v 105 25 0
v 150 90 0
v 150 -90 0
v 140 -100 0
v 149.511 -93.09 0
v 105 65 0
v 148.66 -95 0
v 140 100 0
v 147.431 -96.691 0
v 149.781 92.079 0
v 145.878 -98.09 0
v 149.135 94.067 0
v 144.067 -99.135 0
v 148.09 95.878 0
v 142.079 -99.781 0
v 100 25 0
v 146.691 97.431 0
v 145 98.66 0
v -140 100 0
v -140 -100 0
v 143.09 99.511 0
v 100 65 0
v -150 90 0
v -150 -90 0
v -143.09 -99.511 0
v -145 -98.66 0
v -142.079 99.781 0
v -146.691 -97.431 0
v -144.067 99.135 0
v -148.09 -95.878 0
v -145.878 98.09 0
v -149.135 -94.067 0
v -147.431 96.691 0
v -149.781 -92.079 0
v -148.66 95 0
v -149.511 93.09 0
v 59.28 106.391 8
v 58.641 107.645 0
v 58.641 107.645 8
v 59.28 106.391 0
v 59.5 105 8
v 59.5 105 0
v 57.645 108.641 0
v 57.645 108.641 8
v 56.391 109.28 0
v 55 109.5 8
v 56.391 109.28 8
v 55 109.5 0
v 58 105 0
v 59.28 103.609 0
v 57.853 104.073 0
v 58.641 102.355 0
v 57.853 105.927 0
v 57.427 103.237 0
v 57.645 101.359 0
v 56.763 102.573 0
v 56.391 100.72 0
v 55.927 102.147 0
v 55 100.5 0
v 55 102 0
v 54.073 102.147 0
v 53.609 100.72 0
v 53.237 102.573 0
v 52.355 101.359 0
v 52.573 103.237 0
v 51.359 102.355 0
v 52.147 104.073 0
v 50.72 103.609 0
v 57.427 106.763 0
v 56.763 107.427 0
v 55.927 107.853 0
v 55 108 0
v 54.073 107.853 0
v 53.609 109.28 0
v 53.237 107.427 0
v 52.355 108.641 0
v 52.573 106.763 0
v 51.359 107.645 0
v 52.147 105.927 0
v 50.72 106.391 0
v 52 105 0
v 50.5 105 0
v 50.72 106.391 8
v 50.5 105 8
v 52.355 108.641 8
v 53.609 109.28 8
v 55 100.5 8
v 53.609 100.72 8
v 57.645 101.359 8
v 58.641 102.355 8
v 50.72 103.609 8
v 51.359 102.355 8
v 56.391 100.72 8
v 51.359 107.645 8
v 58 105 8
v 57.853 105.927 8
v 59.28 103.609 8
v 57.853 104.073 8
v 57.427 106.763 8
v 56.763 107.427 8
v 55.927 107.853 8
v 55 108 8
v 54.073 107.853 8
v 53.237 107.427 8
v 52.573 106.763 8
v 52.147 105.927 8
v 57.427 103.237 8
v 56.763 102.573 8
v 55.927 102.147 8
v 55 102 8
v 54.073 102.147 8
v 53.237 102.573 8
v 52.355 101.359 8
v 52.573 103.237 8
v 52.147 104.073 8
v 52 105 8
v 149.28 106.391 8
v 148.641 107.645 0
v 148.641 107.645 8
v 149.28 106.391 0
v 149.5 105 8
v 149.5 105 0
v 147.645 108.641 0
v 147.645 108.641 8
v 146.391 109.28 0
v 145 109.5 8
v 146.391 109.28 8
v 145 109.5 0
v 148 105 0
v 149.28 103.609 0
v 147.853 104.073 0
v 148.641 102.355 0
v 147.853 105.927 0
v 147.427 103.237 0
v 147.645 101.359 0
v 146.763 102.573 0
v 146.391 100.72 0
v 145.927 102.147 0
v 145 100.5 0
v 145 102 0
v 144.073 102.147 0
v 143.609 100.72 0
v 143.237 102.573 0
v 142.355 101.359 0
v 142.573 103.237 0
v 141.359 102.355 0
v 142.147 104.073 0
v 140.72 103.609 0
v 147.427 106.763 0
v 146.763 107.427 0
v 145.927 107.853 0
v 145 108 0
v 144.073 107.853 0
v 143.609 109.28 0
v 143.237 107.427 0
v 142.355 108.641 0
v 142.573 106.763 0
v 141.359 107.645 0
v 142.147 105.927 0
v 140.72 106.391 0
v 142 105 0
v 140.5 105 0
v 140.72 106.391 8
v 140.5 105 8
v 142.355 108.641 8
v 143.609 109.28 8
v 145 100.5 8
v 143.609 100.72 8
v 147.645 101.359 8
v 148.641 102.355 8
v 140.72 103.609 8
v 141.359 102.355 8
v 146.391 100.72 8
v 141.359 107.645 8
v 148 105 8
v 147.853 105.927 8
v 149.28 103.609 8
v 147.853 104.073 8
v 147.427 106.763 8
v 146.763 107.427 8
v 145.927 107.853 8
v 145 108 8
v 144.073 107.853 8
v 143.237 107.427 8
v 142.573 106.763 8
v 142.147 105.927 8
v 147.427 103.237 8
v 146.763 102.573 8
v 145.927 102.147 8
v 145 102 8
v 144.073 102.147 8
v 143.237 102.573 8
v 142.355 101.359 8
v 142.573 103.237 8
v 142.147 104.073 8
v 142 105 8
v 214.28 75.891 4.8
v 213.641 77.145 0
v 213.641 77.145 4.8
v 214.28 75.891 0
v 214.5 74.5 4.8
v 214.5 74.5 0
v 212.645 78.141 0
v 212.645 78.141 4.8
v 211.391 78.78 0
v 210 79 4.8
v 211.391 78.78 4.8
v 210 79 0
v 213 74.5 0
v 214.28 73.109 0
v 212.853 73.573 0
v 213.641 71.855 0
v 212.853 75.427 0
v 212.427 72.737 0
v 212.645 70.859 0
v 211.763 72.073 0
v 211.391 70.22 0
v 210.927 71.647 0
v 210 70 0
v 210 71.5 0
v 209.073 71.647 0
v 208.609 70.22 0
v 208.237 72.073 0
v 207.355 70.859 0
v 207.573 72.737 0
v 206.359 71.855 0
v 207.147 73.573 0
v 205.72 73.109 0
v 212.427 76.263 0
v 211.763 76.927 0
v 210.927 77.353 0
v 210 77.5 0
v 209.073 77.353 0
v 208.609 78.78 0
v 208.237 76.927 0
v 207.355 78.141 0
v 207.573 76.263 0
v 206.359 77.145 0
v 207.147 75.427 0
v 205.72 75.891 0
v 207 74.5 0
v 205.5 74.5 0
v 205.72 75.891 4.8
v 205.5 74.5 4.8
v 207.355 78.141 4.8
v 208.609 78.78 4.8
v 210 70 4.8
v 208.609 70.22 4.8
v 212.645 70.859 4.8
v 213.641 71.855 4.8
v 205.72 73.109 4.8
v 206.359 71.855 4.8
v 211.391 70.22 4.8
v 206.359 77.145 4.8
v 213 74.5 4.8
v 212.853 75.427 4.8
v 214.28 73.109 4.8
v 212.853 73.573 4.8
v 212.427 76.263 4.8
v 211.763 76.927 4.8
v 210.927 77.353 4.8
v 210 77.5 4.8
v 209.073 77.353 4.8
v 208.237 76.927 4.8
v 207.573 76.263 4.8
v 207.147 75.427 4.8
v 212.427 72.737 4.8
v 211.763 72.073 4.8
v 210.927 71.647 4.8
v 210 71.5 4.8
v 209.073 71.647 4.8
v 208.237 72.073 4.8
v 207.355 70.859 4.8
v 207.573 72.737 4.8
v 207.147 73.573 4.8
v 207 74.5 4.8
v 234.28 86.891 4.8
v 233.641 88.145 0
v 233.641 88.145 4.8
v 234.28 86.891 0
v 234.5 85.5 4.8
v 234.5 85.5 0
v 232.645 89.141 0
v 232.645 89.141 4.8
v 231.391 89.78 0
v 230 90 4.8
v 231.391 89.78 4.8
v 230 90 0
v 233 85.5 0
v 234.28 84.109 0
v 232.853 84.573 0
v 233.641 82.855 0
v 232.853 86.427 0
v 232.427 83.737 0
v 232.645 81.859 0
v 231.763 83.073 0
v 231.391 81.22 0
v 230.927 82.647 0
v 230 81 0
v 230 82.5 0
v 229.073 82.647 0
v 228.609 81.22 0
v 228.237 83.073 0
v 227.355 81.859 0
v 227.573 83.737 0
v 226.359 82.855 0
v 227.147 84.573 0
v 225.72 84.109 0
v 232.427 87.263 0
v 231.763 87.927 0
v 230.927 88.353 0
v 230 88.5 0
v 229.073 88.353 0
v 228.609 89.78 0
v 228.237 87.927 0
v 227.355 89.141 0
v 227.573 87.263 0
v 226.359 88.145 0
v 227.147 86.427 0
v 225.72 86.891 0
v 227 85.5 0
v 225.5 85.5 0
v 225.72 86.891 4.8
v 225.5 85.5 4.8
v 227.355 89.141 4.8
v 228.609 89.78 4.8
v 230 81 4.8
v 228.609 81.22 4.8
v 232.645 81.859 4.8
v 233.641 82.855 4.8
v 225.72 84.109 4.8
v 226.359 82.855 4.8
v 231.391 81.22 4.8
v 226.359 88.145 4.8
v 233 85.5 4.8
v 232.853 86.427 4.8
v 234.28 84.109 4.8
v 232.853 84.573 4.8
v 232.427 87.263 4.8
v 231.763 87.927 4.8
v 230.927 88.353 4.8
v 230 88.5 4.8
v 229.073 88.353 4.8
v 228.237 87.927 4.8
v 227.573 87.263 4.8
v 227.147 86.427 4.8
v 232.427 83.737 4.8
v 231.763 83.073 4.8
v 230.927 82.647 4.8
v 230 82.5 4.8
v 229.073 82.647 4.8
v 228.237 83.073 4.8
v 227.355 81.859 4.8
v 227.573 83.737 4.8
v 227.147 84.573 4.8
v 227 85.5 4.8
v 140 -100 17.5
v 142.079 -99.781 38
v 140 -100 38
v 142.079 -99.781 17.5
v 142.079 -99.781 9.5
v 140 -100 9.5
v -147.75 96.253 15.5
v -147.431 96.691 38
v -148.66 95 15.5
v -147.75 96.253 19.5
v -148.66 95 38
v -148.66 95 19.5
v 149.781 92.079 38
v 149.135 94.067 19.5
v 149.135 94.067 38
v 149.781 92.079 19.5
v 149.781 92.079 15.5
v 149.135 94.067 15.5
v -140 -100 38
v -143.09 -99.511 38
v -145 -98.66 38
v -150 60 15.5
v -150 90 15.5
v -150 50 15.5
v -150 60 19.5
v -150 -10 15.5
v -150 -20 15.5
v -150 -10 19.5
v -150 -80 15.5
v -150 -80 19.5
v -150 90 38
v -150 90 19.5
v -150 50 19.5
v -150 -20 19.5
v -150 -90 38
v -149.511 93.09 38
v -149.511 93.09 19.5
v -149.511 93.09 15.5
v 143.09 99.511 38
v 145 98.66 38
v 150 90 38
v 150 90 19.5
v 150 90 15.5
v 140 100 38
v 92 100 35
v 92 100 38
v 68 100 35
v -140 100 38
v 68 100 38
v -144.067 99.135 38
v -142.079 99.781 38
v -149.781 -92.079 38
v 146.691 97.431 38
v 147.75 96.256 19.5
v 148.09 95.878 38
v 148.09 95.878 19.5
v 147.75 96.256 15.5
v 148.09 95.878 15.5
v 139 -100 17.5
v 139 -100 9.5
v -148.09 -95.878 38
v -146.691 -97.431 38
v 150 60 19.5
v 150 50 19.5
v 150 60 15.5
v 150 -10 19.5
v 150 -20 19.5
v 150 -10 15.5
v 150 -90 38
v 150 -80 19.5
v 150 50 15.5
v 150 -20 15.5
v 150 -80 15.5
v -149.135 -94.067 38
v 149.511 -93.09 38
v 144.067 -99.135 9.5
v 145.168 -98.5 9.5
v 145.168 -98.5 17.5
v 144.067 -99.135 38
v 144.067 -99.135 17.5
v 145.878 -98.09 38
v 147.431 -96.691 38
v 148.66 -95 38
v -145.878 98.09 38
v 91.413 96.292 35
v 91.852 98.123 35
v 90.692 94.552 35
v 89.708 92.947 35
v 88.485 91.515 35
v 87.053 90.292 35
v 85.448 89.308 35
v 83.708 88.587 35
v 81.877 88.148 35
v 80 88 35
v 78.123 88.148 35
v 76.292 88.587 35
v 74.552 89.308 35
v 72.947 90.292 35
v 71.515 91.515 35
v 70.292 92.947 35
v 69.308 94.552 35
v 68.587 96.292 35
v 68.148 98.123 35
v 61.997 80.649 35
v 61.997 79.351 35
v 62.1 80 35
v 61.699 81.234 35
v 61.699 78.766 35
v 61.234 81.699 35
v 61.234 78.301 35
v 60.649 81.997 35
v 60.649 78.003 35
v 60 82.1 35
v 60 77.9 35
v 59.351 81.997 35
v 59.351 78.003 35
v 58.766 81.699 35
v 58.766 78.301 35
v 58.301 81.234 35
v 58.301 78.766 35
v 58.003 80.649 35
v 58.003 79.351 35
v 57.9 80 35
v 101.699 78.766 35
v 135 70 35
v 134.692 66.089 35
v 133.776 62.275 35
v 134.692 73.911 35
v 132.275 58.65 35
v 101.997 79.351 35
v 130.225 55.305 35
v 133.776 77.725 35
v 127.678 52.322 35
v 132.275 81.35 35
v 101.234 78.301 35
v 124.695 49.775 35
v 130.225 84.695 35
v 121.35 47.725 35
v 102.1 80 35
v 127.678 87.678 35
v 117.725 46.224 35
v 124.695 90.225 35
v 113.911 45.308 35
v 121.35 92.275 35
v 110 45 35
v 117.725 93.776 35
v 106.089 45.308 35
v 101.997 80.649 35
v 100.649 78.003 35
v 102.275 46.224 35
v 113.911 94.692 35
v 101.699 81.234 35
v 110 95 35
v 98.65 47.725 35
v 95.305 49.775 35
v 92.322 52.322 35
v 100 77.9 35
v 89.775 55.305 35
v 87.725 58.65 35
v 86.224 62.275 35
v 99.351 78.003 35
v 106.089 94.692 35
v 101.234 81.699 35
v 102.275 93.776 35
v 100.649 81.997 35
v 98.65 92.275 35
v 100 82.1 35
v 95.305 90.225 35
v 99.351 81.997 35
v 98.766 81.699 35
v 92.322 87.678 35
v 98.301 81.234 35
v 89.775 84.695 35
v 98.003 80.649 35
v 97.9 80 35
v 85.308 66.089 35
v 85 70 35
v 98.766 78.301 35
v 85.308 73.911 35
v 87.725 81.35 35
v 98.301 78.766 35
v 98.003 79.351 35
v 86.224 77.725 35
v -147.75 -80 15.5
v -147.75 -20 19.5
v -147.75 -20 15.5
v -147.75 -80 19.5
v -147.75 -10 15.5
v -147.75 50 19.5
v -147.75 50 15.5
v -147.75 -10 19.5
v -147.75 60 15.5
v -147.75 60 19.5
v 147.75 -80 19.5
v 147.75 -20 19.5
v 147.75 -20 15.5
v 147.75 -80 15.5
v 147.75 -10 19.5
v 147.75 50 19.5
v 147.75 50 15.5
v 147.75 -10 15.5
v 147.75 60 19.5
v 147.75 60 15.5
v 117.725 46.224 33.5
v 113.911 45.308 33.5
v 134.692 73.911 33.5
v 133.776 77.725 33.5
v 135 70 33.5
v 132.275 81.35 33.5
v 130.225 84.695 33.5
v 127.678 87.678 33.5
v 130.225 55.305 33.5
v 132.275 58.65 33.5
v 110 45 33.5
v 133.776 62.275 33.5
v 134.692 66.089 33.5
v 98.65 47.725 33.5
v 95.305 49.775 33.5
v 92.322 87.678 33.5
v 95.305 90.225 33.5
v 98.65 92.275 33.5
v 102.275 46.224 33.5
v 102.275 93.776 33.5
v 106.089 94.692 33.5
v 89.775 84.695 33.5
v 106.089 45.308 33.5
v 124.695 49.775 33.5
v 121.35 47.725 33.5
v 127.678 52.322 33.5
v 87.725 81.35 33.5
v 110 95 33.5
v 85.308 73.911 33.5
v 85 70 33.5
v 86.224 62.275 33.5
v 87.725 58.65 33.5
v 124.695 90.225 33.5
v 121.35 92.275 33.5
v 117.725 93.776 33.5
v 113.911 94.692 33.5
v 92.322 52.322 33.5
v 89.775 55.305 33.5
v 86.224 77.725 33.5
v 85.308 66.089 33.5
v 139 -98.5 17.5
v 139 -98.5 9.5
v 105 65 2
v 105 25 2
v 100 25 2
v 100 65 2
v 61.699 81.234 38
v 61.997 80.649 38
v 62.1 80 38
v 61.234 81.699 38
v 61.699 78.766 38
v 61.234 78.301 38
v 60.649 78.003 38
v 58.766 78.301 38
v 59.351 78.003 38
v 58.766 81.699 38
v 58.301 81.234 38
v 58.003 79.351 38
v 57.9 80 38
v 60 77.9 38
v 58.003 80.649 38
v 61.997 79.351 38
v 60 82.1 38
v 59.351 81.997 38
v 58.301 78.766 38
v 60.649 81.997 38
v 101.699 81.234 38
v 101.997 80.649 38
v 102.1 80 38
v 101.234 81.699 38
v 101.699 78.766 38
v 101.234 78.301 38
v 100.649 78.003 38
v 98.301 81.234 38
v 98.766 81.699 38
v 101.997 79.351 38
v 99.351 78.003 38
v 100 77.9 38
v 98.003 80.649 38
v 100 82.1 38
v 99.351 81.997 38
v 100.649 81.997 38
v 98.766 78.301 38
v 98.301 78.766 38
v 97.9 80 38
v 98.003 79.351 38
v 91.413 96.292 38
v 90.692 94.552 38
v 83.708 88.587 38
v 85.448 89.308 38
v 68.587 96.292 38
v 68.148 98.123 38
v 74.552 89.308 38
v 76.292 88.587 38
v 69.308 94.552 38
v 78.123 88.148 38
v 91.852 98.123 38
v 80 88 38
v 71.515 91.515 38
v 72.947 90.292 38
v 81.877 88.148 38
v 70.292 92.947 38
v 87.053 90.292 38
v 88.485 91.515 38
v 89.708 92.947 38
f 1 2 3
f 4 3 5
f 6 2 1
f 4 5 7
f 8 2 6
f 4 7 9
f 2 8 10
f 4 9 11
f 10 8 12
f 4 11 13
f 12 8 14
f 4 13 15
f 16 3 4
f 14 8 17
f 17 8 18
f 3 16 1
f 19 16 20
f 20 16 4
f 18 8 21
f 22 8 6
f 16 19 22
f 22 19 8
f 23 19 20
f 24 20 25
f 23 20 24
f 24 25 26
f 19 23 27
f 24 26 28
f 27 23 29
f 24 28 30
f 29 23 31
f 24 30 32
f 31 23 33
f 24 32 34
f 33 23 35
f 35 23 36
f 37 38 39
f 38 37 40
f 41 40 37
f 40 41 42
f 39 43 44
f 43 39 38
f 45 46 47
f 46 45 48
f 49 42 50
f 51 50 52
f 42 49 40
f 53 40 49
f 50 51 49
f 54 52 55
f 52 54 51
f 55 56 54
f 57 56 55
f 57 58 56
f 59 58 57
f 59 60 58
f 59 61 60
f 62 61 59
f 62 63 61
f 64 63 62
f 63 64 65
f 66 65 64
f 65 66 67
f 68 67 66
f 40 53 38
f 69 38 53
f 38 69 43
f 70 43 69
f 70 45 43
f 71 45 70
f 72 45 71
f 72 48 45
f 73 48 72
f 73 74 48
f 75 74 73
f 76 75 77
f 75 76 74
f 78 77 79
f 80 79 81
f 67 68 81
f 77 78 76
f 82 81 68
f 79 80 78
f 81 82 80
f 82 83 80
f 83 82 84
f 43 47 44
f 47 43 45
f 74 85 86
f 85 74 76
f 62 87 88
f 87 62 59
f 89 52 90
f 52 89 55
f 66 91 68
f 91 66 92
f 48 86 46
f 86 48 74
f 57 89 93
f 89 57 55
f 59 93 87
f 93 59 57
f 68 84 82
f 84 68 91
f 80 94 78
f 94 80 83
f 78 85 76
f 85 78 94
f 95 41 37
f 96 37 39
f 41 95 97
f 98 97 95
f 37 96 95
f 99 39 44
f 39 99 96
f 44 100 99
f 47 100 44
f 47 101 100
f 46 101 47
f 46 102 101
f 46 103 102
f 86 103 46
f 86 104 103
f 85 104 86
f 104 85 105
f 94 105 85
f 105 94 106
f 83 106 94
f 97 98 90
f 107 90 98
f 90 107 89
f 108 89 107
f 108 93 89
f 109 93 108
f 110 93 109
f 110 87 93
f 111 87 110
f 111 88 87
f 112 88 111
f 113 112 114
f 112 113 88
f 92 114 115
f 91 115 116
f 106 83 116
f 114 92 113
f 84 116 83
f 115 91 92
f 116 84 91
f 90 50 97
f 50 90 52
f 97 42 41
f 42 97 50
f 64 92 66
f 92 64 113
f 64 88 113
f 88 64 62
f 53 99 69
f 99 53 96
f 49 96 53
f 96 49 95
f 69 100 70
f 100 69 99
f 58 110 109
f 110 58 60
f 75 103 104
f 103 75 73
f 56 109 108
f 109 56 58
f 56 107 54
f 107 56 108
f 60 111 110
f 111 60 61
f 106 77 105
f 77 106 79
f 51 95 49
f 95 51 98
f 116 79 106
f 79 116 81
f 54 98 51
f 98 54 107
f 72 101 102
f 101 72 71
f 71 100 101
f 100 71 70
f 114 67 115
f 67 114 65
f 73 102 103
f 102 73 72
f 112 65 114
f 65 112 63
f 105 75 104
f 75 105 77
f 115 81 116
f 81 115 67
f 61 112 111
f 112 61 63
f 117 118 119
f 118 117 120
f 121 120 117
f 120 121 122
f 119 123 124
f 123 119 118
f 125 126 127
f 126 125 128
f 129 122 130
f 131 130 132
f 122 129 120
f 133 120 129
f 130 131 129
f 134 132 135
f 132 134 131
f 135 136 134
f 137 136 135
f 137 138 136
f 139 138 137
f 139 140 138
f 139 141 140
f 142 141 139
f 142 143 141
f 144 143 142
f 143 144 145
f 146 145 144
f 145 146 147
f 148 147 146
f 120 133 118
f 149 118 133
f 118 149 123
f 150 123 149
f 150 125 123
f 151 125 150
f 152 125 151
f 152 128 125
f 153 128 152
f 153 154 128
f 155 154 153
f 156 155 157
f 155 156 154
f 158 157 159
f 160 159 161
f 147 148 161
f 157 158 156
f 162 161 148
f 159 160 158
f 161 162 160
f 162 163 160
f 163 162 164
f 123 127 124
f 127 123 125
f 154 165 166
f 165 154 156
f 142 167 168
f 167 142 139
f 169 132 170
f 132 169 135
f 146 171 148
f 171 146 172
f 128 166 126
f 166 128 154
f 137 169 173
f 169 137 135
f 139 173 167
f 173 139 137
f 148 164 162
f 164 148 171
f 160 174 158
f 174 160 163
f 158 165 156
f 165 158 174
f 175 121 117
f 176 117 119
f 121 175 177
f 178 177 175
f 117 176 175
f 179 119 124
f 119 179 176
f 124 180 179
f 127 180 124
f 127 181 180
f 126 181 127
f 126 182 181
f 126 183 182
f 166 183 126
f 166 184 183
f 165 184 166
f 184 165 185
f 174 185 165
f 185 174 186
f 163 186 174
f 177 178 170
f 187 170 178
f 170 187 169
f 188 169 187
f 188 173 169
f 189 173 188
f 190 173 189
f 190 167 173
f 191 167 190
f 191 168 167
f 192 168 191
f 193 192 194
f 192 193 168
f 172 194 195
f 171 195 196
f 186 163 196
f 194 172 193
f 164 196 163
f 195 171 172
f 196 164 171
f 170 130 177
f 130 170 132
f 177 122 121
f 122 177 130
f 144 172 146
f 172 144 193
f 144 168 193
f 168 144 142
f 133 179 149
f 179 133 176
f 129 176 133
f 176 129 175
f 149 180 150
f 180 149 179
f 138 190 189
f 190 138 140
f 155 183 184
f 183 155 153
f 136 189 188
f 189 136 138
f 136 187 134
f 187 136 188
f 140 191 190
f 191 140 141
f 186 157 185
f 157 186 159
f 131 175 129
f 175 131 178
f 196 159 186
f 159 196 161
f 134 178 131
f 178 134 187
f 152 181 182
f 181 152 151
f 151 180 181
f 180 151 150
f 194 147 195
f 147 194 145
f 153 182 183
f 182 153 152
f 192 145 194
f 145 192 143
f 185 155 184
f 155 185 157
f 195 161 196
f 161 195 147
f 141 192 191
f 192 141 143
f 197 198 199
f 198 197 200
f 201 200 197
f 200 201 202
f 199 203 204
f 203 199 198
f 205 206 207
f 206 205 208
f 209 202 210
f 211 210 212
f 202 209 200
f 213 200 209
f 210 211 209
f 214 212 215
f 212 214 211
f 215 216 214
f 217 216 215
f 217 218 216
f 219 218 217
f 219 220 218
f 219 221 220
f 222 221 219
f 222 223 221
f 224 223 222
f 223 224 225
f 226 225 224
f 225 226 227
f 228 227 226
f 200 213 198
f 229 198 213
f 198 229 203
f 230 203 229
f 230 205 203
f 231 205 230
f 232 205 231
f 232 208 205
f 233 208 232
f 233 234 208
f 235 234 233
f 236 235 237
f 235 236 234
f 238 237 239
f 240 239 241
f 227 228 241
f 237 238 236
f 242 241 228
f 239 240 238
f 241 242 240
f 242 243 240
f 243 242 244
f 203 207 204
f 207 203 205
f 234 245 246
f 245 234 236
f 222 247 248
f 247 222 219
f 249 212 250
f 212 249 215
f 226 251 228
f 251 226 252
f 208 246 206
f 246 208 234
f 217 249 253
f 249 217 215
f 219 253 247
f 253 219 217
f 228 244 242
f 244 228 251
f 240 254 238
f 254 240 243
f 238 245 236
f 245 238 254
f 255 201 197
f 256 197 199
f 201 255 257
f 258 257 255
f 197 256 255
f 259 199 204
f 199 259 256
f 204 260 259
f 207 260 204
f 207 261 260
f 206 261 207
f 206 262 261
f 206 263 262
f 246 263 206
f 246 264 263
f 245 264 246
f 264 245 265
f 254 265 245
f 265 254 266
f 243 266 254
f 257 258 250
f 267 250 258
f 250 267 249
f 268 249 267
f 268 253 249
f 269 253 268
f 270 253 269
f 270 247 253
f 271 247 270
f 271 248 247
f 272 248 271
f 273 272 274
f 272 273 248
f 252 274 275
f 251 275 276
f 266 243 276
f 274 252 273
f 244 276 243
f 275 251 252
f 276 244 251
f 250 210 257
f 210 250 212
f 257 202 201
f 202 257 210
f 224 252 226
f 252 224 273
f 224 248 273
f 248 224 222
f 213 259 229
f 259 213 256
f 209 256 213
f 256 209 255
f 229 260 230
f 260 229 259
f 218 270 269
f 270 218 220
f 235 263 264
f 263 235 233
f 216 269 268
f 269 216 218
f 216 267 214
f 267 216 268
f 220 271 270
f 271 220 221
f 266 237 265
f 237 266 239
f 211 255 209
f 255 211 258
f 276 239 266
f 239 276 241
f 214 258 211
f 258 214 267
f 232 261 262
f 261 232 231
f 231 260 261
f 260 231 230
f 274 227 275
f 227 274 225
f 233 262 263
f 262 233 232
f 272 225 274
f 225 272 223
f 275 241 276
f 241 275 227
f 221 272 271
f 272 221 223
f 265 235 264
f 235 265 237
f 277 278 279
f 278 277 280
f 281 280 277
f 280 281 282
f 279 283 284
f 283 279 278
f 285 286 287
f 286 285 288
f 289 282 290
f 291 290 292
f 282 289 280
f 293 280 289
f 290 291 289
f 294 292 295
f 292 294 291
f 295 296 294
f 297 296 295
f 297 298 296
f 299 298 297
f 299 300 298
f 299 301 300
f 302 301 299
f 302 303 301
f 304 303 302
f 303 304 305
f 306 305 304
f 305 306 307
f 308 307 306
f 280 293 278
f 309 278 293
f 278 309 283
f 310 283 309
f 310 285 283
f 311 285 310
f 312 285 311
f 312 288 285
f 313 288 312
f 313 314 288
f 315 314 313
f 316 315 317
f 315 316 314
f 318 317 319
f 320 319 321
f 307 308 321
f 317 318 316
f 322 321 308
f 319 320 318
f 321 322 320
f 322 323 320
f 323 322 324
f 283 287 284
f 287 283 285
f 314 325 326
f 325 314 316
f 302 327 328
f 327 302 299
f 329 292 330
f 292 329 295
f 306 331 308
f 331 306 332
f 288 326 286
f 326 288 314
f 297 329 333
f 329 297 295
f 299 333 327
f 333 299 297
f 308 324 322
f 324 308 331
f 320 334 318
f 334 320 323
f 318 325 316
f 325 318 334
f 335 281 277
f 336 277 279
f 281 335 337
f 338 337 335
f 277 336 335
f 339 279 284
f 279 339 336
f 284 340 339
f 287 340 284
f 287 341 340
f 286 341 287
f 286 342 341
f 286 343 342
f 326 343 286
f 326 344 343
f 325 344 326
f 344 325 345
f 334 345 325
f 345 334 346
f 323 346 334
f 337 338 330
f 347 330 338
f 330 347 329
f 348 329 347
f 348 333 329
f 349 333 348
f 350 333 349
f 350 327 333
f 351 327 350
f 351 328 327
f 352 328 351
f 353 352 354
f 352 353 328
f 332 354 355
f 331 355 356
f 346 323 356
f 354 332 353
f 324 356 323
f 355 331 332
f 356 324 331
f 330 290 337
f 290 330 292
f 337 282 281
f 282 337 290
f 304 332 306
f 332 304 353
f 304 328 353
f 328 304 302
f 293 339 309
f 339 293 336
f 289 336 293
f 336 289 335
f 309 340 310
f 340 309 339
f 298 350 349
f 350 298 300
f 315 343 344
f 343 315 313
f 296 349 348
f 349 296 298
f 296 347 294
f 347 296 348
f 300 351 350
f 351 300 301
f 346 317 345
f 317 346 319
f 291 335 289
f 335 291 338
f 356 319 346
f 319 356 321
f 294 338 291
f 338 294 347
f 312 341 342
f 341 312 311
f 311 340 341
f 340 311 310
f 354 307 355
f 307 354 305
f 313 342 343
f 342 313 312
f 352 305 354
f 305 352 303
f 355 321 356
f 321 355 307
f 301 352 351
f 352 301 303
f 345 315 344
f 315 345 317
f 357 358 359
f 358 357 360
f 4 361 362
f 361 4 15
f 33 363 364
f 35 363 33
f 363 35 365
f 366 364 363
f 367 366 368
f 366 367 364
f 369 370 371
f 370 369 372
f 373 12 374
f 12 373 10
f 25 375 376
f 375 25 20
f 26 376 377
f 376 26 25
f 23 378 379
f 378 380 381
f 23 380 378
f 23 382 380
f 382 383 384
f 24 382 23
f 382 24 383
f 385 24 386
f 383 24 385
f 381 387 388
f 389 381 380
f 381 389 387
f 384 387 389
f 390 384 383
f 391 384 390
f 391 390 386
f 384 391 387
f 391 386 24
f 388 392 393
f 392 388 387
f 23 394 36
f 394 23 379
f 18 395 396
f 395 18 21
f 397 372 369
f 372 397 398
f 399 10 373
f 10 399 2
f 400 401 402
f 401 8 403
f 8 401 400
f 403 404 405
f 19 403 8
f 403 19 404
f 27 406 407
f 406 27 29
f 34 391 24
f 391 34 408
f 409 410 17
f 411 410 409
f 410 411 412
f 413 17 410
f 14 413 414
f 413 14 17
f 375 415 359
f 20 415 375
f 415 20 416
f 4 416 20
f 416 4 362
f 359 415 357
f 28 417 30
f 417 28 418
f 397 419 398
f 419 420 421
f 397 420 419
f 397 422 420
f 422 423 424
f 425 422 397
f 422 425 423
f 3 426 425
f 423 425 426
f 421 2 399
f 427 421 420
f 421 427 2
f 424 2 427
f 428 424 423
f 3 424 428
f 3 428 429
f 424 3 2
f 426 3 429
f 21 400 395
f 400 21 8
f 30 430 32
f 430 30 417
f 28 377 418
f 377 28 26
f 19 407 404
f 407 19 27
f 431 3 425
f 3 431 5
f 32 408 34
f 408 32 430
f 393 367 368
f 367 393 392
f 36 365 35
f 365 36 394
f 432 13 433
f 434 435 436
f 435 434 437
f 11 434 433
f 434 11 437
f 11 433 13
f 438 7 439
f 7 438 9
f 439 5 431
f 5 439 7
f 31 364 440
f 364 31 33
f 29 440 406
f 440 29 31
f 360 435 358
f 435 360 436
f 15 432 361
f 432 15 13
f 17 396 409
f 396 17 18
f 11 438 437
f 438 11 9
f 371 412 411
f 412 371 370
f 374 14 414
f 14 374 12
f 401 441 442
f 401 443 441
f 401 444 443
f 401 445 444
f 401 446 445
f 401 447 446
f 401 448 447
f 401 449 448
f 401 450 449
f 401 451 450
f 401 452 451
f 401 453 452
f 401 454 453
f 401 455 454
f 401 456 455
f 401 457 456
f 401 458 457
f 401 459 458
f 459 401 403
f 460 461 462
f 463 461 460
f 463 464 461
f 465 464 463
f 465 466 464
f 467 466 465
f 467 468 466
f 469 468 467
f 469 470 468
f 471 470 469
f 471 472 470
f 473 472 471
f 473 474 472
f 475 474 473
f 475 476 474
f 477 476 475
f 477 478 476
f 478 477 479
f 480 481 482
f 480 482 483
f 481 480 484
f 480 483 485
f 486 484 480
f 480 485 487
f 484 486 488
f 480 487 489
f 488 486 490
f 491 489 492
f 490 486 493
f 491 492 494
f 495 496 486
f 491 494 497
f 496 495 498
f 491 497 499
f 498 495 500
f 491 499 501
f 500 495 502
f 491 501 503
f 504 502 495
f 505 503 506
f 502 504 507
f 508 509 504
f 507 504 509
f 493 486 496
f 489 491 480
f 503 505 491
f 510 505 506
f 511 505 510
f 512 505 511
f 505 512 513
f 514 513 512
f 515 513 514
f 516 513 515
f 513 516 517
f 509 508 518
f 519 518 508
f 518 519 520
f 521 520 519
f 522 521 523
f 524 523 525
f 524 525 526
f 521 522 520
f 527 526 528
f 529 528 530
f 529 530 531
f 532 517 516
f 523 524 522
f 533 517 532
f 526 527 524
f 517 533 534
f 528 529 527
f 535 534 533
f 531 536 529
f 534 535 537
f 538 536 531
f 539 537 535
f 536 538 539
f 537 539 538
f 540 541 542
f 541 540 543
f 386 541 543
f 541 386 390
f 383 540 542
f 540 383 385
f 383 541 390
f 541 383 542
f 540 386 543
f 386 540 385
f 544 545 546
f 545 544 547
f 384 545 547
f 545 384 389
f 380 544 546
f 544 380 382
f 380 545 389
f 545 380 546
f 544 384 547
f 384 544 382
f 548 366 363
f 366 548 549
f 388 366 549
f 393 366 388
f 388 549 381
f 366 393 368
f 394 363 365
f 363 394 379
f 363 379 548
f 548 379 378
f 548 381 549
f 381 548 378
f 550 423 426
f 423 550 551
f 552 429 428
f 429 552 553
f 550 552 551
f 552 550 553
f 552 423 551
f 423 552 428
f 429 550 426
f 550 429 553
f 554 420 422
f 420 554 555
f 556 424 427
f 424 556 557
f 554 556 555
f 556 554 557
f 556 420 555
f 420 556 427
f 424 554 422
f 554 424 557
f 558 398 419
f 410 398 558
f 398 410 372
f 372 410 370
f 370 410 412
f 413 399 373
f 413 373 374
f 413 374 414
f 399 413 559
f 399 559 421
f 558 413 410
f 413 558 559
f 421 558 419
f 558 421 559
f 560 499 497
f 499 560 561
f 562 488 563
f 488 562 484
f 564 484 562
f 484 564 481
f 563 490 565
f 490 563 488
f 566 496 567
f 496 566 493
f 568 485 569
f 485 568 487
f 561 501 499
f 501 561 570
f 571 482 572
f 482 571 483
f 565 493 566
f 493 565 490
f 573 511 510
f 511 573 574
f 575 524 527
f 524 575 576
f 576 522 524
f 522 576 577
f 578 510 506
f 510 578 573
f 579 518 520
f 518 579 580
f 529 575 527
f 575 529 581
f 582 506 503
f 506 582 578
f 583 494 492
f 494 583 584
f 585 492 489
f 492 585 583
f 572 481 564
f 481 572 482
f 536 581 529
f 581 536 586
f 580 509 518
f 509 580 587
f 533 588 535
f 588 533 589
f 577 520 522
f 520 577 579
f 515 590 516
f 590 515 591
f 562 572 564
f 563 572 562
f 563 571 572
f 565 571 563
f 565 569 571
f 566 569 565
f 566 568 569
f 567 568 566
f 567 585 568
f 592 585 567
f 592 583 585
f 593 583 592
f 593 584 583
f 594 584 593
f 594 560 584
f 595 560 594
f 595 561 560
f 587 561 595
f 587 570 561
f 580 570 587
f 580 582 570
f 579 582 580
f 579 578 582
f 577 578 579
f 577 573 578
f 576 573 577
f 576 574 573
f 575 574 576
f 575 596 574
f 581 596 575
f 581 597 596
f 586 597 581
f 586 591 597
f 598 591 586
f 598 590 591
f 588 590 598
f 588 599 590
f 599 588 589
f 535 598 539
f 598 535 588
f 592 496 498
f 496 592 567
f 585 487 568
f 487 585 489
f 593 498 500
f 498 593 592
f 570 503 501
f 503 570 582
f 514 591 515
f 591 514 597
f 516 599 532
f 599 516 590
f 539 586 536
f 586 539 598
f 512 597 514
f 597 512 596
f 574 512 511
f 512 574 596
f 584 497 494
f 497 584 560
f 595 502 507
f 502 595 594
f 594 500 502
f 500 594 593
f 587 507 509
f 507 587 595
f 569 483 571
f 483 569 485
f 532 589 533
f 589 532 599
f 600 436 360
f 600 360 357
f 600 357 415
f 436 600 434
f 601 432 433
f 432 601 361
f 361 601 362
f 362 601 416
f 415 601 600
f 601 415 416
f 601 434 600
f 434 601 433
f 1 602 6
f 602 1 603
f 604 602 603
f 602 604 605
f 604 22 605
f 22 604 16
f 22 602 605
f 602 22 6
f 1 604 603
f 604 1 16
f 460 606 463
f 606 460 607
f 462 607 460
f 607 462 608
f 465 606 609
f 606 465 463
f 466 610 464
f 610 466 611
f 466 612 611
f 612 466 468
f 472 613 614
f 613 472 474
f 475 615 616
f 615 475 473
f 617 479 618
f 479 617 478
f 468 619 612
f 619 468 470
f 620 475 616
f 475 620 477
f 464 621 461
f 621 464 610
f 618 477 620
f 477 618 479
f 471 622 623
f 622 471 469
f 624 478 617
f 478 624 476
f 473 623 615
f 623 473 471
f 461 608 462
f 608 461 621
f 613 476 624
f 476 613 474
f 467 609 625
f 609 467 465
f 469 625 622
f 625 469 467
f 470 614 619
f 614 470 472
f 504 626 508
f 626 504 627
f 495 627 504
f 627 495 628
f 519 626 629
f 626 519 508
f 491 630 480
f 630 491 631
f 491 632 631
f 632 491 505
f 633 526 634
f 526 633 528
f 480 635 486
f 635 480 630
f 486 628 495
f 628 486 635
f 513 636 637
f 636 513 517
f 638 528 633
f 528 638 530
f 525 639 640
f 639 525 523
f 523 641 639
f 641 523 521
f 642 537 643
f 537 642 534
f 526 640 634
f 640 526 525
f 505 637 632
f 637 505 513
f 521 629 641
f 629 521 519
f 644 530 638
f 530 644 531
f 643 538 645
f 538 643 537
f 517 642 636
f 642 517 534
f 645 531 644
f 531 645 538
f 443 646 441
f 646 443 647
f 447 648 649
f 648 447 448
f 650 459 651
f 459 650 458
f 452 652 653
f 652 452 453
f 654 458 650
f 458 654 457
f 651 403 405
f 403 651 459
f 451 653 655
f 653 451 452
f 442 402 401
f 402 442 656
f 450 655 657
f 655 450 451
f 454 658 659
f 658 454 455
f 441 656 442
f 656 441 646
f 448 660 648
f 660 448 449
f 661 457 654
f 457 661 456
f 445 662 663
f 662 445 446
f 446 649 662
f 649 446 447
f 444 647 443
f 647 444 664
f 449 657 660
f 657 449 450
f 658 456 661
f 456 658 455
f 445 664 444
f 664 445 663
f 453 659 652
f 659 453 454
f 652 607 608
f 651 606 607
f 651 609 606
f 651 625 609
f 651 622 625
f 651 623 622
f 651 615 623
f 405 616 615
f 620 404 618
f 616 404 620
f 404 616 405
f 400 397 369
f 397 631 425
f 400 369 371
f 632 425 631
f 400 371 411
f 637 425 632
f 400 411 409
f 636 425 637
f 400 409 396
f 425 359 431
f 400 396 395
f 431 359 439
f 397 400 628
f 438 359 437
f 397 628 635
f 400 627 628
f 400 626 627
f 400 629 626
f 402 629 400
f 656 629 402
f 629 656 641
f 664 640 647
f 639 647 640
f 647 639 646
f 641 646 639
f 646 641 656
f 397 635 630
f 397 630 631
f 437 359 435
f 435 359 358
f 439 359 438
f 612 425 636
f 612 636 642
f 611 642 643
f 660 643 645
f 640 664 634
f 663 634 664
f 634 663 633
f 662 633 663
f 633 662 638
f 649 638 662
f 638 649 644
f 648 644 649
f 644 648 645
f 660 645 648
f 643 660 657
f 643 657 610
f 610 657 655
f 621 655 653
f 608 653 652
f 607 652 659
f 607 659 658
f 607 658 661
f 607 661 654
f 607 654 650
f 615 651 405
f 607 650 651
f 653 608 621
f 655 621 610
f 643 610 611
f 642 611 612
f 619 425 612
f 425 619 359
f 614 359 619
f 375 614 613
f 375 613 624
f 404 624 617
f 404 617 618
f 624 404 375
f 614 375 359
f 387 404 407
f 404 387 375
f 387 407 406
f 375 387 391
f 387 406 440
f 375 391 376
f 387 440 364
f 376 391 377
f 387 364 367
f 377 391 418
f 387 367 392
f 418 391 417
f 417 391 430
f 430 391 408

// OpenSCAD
// =====================================================================
// STALE REFERENCE ONLY - do not build from this file. 2026-09-06.
//
// Superseded twice:
//   D-010 - TP4056 removed and the external USB-C slot deleted. This file
//           still models both (TP4056_X/Y standoffs, USB_X_POS slot).
//   D-011 - enclosure CAD moved to Fusion 360 via the fusion-design skill.
//           OpenSCAD is no longer the workflow.
//
// Known geometry defects, independent of the decisions above:
//   - mixed centre-origin and corner-origin coordinates
//   - BROOK_HOLE_SPACING = 90 cannot fit a 52 mm board dimension
//   - a ventilation slot that falls outside the body
//   - foot recesses that subtract from nothing
//
// The parameter block below is still useful as dimensional reference.
// Authoritative numbers: docs/06-enclosure-reference.md
// =====================================================================

// Wireless Arcade Lap Pad Enclosure
// Two-piece snap-fit design for 3D printing
// OpenSCAD parametric design

// ====================
// PARAMETERS & CONFIG
// ====================

// View mode: "top", "bottom", "assembled"
VIEW_MODE = "assembled";

// Overall dimensions
PAD_WIDTH = 300;          // mm, overall width (left-right)
PAD_DEPTH = 200;          // mm, overall depth (front-back)
PAD_HEIGHT = 40;          // mm, overall height
CORNER_RADIUS = 10;       // mm, rounded corner radius

// Top plate
TOP_THICKNESS = 3;        // mm
BUTTON_HOLE_DIA = 30;     // mm, action button hole diameter
JOYSTICK_HOLE_DIA = 24;   // mm, Sanwa JLF center hole

// Bottom tray
BOTTOM_DEPTH = 35;        // mm, internal depth for electronics
WALL_THICKNESS = 2;       // mm, minimum wall thickness

// Snap-fit tabs
SNAP_TAB_WIDTH = 15;      // mm, width of each snap-fit tab
SNAP_TAB_DEPTH = 5;       // mm, depth (how far they protrude)
SNAP_TAB_HEIGHT = 2;      // mm, vertical thickness of tabs
SNAP_TAB_SPACING = 60;    // mm, spacing between tabs from center

// Standoff dimensions
STANDOFF_HEIGHT = 8;      // mm, height above bottom
STANDOFF_DIA = 6;         // mm, diameter for M3 screws
STANDOFF_WALL = 1.5;      // mm, wall thickness for standoffs

// Component dimensions and positions
// Brook Gen 5W: 97mm x 52mm, 4 corner M3 holes
BROOK_WIDTH = 97;
BROOK_DEPTH = 52;
BROOK_X = 100;            // mm from left edge
BROOK_Y = 60;             // mm from front edge
BROOK_HOLE_SPACING = 90;  // mm, diagonal spacing

// TP4056 charging module: 26mm x 17mm
TP4056_WIDTH = 26;
TP4056_DEPTH = 17;
TP4056_X = 220;
TP4056_Y = 80;

// LiPo battery: 95mm x 33mm x 10mm
BATTERY_WIDTH = 95;
BATTERY_DEPTH = 33;
BATTERY_HEIGHT = 10;
BATTERY_X = 105;
BATTERY_Y = 30;

// Qi receiver coil
QI_DIA = 50;              // mm, diameter of coil
QI_DEPTH = 1.5;           // mm, recess depth

// USB-C access
USB_WIDTH = 12;           // mm, slot width
USB_HEIGHT = 8;           // mm, slot height
USB_X_POS = 145;          // mm, position on bottom edge

// Anti-slip feet
FOOT_DIA = 10;            // mm, diameter of foot recess
FOOT_DEPTH = 1.5;         // mm, depth of recess
FOOT_INSET = 15;          // mm, inset from corner

// Text label
LABEL_TEXT = "PLAYER 1";
TEXT_SIZE = 8;            // mm, font size

// Joystick position (left third of pad)
STICK_X = 80;             // mm from left edge
STICK_Y = 100;            // mm from front edge

// Button cluster positions (right of joystick)
BTN_START_X = 170;        // mm, left button of top row
BTN_START_Y = 70;         // mm, top row Y position
BTN_SPACING_X = 36;       // mm, center-to-center horizontal spacing
BTN_SPACING_Y = 30;       // mm, row-to-row vertical spacing
BTN_ROW_OFFSET_X = 12;    // mm, offset for second row

// OLED display cutout: 27mm x 15mm
OLED_WIDTH = 27;
OLED_HEIGHT = 15;
OLED_X = 150;             // mm from left edge
OLED_Y = 170;             // mm from front edge (near top)

// Ventilation
VENT_SLOT_WIDTH = 4;      // mm, width of ventilation slots
VENT_SLOT_DEPTH = 60;     // mm, length of ventilation slots
VENT_SPACING = 10;        // mm, spacing between slots

// Cable routing
CABLE_CHANNEL_WIDTH = 5;  // mm
CABLE_CHANNEL_DEPTH = 2;  // mm

// Tolerance
TOLERANCE = 0.3;          // mm, snap-fit tolerance


// ====================
// MODULES & FUNCTIONS
// ====================

// Rounded rectangle (2D)
module rounded_rect_2d(width, depth, radius) {
    offset(r = radius) {
        offset(r = -radius) {
            square([width, depth], center = true);
        }
    }
}

// Rounded rectangle (3D extrusion)
module rounded_rect(width, depth, height, radius) {
    linear_extrude(height = height) {
        rounded_rect_2d(width, depth, radius);
    }
}

// Snap-fit tab (protrudes from edge)
module snap_tab(tab_width, tab_depth, tab_height) {
    cube([tab_width, tab_depth, tab_height], center = true);
}

// Rounded cylinder for buttons/joystick holes
module button_hole(diameter, depth = 5) {
    cylinder(d = diameter, h = depth, $fn = 40);
}

// Standoff for component mounting
module standoff(height, dia, wall_thickness) {
    difference() {
        cylinder(h = height, d = dia + wall_thickness * 2, $fn = 20);
        cylinder(h = height, d = dia, $fn = 20);
    }
}

// Anti-slip foot recess
module foot_recess(dia, depth, inset) {
    translate([inset, inset, 0]) {
        cylinder(h = depth, d = dia, $fn = 20);
    }
}


// ====================
// TOP PLATE
// ====================

module top_plate() {
    difference() {
        // Main top plate body
        rounded_rect(PAD_WIDTH, PAD_DEPTH, TOP_THICKNESS, CORNER_RADIUS);

        // ===== JOYSTICK CUTOUTS =====
        translate([STICK_X, STICK_Y, -0.5]) {
            // Center hole for joystick shaft
            cylinder(d = JOYSTICK_HOLE_DIA, h = TOP_THICKNESS + 1, $fn = 40);

            // Sanwa JLF mounting holes (4 corner holes on ~84mm diagonal)
            // Standard pattern: holes on 40mm centers forming square
            hole_spacing = 40;
            for (dx = [-hole_spacing/2, hole_spacing/2]) {
                for (dy = [-hole_spacing/2, hole_spacing/2]) {
                    translate([dx, dy, 0]) {
                        cylinder(d = 4.2, h = TOP_THICKNESS + 1, $fn = 20);
                    }
                }
            }
        }

        // ===== ACTION BUTTON CUTOUTS =====
        // 6 buttons in 2x3 layout (Vewlix-style)
        // Top row: 3 buttons
        for (i = [0:2]) {
            btn_x = BTN_START_X + i * BTN_SPACING_X;
            btn_y = BTN_START_Y;
            translate([btn_x, btn_y, -0.5]) {
                button_hole(BUTTON_HOLE_DIA, TOP_THICKNESS + 1);
            }
        }

        // Bottom row: 3 buttons (offset)
        for (i = [0:2]) {
            btn_x = BTN_START_X + BTN_ROW_OFFSET_X + i * BTN_SPACING_X;
            btn_y = BTN_START_Y + BTN_SPACING_Y;
            translate([btn_x, btn_y, -0.5]) {
                button_hole(BUTTON_HOLE_DIA, TOP_THICKNESS + 1);
            }
        }

        // ===== OLED DISPLAY CUTOUT =====
        translate([OLED_X, OLED_Y, -0.5]) {
            cube([OLED_WIDTH, OLED_HEIGHT, TOP_THICKNESS + 1], center = true);
        }
    }

    // ===== SNAP-FIT TABS (on underside of top plate) =====
    // Front edge tabs
    for (x_offset = [-SNAP_TAB_SPACING, 0, SNAP_TAB_SPACING]) {
        translate([x_offset, -PAD_DEPTH/2 + SNAP_TAB_DEPTH/2, -SNAP_TAB_HEIGHT]) {
            snap_tab(SNAP_TAB_WIDTH, SNAP_TAB_DEPTH, SNAP_TAB_HEIGHT);
        }
    }

    // Back edge tabs
    for (x_offset = [-SNAP_TAB_SPACING, 0, SNAP_TAB_SPACING]) {
        translate([x_offset, PAD_DEPTH/2 - SNAP_TAB_DEPTH/2, -SNAP_TAB_HEIGHT]) {
            snap_tab(SNAP_TAB_WIDTH, SNAP_TAB_DEPTH, SNAP_TAB_HEIGHT);
        }
    }

    // Left edge tabs
    for (y_offset = [-SNAP_TAB_SPACING, 0, SNAP_TAB_SPACING]) {
        translate([-PAD_WIDTH/2 + SNAP_TAB_DEPTH/2, y_offset, -SNAP_TAB_HEIGHT]) {
            snap_tab(SNAP_TAB_DEPTH, SNAP_TAB_WIDTH, SNAP_TAB_HEIGHT);
        }
    }

    // Right edge tabs
    for (y_offset = [-SNAP_TAB_SPACING, 0, SNAP_TAB_SPACING]) {
        translate([PAD_WIDTH/2 - SNAP_TAB_DEPTH/2, y_offset, -SNAP_TAB_HEIGHT]) {
            snap_tab(SNAP_TAB_DEPTH, SNAP_TAB_WIDTH, SNAP_TAB_HEIGHT);
        }
    }
}


// ====================
// BOTTOM TRAY
// ====================

module bottom_tray() {
    difference() {
        union() {
            // Main tray body (box)
            linear_extrude(height = BOTTOM_DEPTH) {
                rounded_rect_2d(PAD_WIDTH, PAD_DEPTH, CORNER_RADIUS);
            }

            // ===== COMPONENT STANDOFFS =====

            // Brook Gen 5W board: 4 corner standoffs
            brook_holes = [
                [BROOK_X - BROOK_HOLE_SPACING/2, BROOK_Y - BROOK_HOLE_SPACING/2],
                [BROOK_X + BROOK_HOLE_SPACING/2, BROOK_Y - BROOK_HOLE_SPACING/2],
                [BROOK_X - BROOK_HOLE_SPACING/2, BROOK_Y + BROOK_HOLE_SPACING/2],
                [BROOK_X + BROOK_HOLE_SPACING/2, BROOK_Y + BROOK_HOLE_SPACING/2]
            ];

            for (pos = brook_holes) {
                translate([pos[0], pos[1], 0]) {
                    standoff(STANDOFF_HEIGHT, STANDOFF_DIA, STANDOFF_WALL);
                }
            }

            // TP4056 module: 2 corner standoffs
            tp4056_holes = [
                [TP4056_X - TP4056_WIDTH/2 + 3, TP4056_Y - TP4056_DEPTH/2 + 3],
                [TP4056_X + TP4056_WIDTH/2 - 3, TP4056_Y + TP4056_DEPTH/2 - 3]
            ];

            for (pos = tp4056_holes) {
                translate([pos[0], pos[1], 0]) {
                    standoff(STANDOFF_HEIGHT * 0.6, STANDOFF_DIA, STANDOFF_WALL);
                }
            }
        }

        // ===== QI RECEIVER COIL RECESS (bottom flush) =====
        translate([PAD_WIDTH/2 - 40, PAD_DEPTH/2 - 30, BOTTOM_DEPTH - QI_DEPTH]) {
            cylinder(d = QI_DIA, h = QI_DEPTH + 0.5, $fn = 40);
        }

        // ===== USB-C ACCESS SLOT =====
        translate([USB_X_POS, -PAD_DEPTH/2, BOTTOM_DEPTH/2 - USB_HEIGHT/2]) {
            cube([USB_WIDTH, WALL_THICKNESS + 1, USB_HEIGHT], center = true);
        }

        // ===== VENTILATION SLOTS (sides) =====
        // Left side slots
        for (i = [0:3]) {
            slot_y = -PAD_DEPTH/4 + i * (VENT_SPACING + VENT_SLOT_DEPTH);
            translate([-PAD_WIDTH/2 + WALL_THICKNESS/2, slot_y, BOTTOM_DEPTH/2]) {
                cube([WALL_THICKNESS + 0.5, VENT_SLOT_DEPTH, VENT_SLOT_WIDTH], center = true);
            }
        }

        // Right side slots
        for (i = [0:3]) {
            slot_y = -PAD_DEPTH/4 + i * (VENT_SPACING + VENT_SLOT_DEPTH);
            translate([PAD_WIDTH/2 - WALL_THICKNESS/2, slot_y, BOTTOM_DEPTH/2]) {
                cube([WALL_THICKNESS + 0.5, VENT_SLOT_DEPTH, VENT_SLOT_WIDTH], center = true);
            }
        }

        // ===== CABLE ROUTING CHANNELS =====
        // Channel from Brook to TP4056
        translate([(BROOK_X + TP4056_X)/2, (BROOK_Y + TP4056_Y)/2, CABLE_CHANNEL_DEPTH/2]) {
            cube([CABLE_CHANNEL_WIDTH, 40, CABLE_CHANNEL_DEPTH], center = true);
        }

        // Channel to battery bay
        translate([(BROOK_X + BATTERY_X)/2, (BROOK_Y + BATTERY_Y)/2, CABLE_CHANNEL_DEPTH/2]) {
            cube([CABLE_CHANNEL_WIDTH, 40, CABLE_CHANNEL_DEPTH], center = true);
        }
    }

    // ===== SNAP-FIT RECEPTACLES (on rim of tray) =====
    // Front receptacles
    for (x_offset = [-SNAP_TAB_SPACING, 0, SNAP_TAB_SPACING]) {
        translate([x_offset, -PAD_DEPTH/2 + SNAP_TAB_DEPTH/2, BOTTOM_DEPTH - SNAP_TAB_HEIGHT]) {
            snap_tab(SNAP_TAB_WIDTH, SNAP_TAB_DEPTH, SNAP_TAB_HEIGHT);
        }
    }

    // Back receptacles
    for (x_offset = [-SNAP_TAB_SPACING, 0, SNAP_TAB_SPACING]) {
        translate([x_offset, PAD_DEPTH/2 - SNAP_TAB_DEPTH/2, BOTTOM_DEPTH - SNAP_TAB_HEIGHT]) {
            snap_tab(SNAP_TAB_WIDTH, SNAP_TAB_DEPTH, SNAP_TAB_HEIGHT);
        }
    }

    // Left receptacles
    for (y_offset = [-SNAP_TAB_SPACING, 0, SNAP_TAB_SPACING]) {
        translate([-PAD_WIDTH/2 + SNAP_TAB_DEPTH/2, y_offset, BOTTOM_DEPTH - SNAP_TAB_HEIGHT]) {
            snap_tab(SNAP_TAB_DEPTH, SNAP_TAB_WIDTH, SNAP_TAB_HEIGHT);
        }
    }

    // Right receptacles
    for (y_offset = [-SNAP_TAB_SPACING, 0, SNAP_TAB_SPACING]) {
        translate([PAD_WIDTH/2 - SNAP_TAB_DEPTH/2, y_offset, BOTTOM_DEPTH - SNAP_TAB_HEIGHT]) {
            snap_tab(SNAP_TAB_DEPTH, SNAP_TAB_WIDTH, SNAP_TAB_HEIGHT);
        }
    }

    // ===== ANTI-SLIP FOOT RECESSES (on bottom outer surface) =====
    difference() {
        union() {}

        // Front-left foot
        translate([-PAD_WIDTH/2, -PAD_DEPTH/2, -0.1]) {
            foot_recess(FOOT_DIA, FOOT_DEPTH, FOOT_INSET);
        }

        // Front-right foot
        translate([PAD_WIDTH/2, -PAD_DEPTH/2, -0.1]) {
            translate([-FOOT_INSET, 0, 0]) {
                foot_recess(FOOT_DIA, FOOT_DEPTH, 0);
            }
        }

        // Back-left foot
        translate([-PAD_WIDTH/2, PAD_DEPTH/2, -0.1]) {
            translate([0, -FOOT_INSET, 0]) {
                foot_recess(FOOT_DIA, FOOT_DEPTH, 0);
            }
        }

        // Back-right foot
        translate([PAD_WIDTH/2, PAD_DEPTH/2, -0.1]) {
            translate([-FOOT_INSET, -FOOT_INSET, 0]) {
                foot_recess(FOOT_DIA, FOOT_DEPTH, 0);
            }
        }
    }

    // ===== EMBOSSED TEXT LABEL =====
    translate([-PAD_WIDTH/2 + 40, PAD_DEPTH/2 - 25, BOTTOM_DEPTH - 0.5]) {
        linear_extrude(height = 0.8) {
            text(LABEL_TEXT, size = TEXT_SIZE, halign = "left", valign = "center",
                 font = "Arial:style=Bold");
        }
    }
}


// ====================
// ASSEMBLY & VISUALIZATION
// ====================

module assembled_view() {
    // Bottom tray at z=0
    bottom_tray();

    // Top plate positioned above
    translate([0, 0, BOTTOM_DEPTH]) {
        top_plate();
    }

    // Optional: Show component outlines for reference (commented out)
    // %translate([BROOK_X, BROOK_Y, 1]) {
    //     cube([BROOK_WIDTH, BROOK_DEPTH, 5], center = true);
    // }
}


// ====================
// MAIN RENDER
// ====================

if (VIEW_MODE == "top") {
    top_plate();
} else if (VIEW_MODE == "bottom") {
    bottom_tray();
} else if (VIEW_MODE == "assembled") {
    assembled_view();
} else {
    // Default to assembled
    assembled_view();
}

// Recommended print settings:
// - PLA or PETG
// - 0.2mm layer height
// - 100% infill for structural parts, 15-20% for tray walls
// - Print top plate flat (no supports needed)
// - Print bottom tray flat (no supports needed if coil recess is on top during print)
// - Snap-fit tolerance: 0.3mm allows easy insertion while maintaining grip
